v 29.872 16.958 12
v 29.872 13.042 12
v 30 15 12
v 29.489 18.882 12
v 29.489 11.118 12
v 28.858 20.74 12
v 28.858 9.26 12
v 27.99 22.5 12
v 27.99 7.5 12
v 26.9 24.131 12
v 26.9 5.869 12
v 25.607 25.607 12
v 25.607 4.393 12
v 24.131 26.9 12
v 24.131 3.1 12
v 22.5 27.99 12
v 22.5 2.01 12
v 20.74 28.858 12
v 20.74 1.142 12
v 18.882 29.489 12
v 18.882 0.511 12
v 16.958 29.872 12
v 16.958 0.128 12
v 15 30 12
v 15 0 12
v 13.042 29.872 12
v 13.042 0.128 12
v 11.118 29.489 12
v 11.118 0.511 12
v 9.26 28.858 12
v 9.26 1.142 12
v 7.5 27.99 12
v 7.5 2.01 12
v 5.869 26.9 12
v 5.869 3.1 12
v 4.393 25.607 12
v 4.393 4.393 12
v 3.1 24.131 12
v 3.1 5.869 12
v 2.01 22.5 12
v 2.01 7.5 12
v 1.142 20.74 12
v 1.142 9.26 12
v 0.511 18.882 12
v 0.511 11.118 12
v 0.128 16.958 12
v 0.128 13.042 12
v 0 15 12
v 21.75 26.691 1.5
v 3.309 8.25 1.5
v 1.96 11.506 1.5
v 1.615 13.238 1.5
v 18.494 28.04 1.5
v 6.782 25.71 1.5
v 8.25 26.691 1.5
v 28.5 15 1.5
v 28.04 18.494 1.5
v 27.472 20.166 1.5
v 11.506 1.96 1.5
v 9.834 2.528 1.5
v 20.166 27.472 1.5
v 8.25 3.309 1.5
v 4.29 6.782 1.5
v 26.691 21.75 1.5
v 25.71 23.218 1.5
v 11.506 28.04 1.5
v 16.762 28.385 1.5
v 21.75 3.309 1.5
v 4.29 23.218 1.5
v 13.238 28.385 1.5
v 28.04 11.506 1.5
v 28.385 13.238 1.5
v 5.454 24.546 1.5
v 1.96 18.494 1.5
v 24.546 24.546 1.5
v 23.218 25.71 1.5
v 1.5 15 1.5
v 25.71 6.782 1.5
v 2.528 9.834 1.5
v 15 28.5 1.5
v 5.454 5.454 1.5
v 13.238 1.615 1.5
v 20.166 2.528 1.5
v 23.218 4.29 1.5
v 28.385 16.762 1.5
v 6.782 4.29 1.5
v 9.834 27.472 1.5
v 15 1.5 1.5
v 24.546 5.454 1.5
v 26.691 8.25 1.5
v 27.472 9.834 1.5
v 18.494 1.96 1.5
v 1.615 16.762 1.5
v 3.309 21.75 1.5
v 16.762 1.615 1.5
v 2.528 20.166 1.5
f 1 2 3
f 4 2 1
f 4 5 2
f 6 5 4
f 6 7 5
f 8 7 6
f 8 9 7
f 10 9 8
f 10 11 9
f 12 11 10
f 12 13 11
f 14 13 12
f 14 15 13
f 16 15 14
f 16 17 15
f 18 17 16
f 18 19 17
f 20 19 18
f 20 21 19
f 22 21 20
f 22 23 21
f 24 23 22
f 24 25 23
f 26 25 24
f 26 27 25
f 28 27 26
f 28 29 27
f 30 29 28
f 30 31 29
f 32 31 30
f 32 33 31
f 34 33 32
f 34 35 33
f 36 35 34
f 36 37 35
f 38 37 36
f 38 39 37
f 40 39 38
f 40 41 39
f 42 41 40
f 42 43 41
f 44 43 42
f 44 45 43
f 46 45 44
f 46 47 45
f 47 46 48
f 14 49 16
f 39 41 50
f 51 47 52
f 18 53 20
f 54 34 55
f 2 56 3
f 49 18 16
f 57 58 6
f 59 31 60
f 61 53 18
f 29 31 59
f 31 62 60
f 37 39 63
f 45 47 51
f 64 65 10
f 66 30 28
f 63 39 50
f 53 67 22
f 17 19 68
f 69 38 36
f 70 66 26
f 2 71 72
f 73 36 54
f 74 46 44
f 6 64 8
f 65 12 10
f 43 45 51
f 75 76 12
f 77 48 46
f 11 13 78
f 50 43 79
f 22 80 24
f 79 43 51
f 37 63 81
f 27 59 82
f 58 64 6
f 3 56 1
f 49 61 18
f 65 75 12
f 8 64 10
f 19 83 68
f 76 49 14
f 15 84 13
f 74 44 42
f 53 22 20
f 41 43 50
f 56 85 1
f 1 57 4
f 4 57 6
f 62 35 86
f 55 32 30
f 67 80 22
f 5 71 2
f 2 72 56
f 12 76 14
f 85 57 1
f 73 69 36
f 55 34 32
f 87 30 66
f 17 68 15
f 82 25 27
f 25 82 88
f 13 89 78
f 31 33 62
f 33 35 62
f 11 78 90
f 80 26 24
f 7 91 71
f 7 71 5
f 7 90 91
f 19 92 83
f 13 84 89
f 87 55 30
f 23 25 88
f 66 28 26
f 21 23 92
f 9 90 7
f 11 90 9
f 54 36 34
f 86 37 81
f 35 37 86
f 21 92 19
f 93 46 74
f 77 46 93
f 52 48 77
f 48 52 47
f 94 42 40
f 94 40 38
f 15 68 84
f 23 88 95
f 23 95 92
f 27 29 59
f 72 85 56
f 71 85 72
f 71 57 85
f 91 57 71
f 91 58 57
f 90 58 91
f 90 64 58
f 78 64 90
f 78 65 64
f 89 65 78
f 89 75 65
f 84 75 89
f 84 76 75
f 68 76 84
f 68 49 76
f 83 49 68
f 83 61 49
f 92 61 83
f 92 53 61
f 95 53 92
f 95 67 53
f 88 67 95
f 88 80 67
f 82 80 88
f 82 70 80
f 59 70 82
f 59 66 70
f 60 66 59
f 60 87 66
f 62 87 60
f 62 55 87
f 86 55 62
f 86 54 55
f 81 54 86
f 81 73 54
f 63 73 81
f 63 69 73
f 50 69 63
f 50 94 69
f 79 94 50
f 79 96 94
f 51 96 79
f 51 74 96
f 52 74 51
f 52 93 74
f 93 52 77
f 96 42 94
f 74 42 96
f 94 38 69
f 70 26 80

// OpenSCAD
// units=mm — generated by scad_emitter.py
// part=unnamed
$fn = 48;

intersection() { translate([15, 15, 0]) cylinder(h=12, r=15, $fn=$fn); hull() { translate([15,15,1.5]) cylinder(h=0.01,r=13.5,$fn=$fn); translate([15,15,12]) cylinder(h=0.01,r=15,$fn=$fn); } }
